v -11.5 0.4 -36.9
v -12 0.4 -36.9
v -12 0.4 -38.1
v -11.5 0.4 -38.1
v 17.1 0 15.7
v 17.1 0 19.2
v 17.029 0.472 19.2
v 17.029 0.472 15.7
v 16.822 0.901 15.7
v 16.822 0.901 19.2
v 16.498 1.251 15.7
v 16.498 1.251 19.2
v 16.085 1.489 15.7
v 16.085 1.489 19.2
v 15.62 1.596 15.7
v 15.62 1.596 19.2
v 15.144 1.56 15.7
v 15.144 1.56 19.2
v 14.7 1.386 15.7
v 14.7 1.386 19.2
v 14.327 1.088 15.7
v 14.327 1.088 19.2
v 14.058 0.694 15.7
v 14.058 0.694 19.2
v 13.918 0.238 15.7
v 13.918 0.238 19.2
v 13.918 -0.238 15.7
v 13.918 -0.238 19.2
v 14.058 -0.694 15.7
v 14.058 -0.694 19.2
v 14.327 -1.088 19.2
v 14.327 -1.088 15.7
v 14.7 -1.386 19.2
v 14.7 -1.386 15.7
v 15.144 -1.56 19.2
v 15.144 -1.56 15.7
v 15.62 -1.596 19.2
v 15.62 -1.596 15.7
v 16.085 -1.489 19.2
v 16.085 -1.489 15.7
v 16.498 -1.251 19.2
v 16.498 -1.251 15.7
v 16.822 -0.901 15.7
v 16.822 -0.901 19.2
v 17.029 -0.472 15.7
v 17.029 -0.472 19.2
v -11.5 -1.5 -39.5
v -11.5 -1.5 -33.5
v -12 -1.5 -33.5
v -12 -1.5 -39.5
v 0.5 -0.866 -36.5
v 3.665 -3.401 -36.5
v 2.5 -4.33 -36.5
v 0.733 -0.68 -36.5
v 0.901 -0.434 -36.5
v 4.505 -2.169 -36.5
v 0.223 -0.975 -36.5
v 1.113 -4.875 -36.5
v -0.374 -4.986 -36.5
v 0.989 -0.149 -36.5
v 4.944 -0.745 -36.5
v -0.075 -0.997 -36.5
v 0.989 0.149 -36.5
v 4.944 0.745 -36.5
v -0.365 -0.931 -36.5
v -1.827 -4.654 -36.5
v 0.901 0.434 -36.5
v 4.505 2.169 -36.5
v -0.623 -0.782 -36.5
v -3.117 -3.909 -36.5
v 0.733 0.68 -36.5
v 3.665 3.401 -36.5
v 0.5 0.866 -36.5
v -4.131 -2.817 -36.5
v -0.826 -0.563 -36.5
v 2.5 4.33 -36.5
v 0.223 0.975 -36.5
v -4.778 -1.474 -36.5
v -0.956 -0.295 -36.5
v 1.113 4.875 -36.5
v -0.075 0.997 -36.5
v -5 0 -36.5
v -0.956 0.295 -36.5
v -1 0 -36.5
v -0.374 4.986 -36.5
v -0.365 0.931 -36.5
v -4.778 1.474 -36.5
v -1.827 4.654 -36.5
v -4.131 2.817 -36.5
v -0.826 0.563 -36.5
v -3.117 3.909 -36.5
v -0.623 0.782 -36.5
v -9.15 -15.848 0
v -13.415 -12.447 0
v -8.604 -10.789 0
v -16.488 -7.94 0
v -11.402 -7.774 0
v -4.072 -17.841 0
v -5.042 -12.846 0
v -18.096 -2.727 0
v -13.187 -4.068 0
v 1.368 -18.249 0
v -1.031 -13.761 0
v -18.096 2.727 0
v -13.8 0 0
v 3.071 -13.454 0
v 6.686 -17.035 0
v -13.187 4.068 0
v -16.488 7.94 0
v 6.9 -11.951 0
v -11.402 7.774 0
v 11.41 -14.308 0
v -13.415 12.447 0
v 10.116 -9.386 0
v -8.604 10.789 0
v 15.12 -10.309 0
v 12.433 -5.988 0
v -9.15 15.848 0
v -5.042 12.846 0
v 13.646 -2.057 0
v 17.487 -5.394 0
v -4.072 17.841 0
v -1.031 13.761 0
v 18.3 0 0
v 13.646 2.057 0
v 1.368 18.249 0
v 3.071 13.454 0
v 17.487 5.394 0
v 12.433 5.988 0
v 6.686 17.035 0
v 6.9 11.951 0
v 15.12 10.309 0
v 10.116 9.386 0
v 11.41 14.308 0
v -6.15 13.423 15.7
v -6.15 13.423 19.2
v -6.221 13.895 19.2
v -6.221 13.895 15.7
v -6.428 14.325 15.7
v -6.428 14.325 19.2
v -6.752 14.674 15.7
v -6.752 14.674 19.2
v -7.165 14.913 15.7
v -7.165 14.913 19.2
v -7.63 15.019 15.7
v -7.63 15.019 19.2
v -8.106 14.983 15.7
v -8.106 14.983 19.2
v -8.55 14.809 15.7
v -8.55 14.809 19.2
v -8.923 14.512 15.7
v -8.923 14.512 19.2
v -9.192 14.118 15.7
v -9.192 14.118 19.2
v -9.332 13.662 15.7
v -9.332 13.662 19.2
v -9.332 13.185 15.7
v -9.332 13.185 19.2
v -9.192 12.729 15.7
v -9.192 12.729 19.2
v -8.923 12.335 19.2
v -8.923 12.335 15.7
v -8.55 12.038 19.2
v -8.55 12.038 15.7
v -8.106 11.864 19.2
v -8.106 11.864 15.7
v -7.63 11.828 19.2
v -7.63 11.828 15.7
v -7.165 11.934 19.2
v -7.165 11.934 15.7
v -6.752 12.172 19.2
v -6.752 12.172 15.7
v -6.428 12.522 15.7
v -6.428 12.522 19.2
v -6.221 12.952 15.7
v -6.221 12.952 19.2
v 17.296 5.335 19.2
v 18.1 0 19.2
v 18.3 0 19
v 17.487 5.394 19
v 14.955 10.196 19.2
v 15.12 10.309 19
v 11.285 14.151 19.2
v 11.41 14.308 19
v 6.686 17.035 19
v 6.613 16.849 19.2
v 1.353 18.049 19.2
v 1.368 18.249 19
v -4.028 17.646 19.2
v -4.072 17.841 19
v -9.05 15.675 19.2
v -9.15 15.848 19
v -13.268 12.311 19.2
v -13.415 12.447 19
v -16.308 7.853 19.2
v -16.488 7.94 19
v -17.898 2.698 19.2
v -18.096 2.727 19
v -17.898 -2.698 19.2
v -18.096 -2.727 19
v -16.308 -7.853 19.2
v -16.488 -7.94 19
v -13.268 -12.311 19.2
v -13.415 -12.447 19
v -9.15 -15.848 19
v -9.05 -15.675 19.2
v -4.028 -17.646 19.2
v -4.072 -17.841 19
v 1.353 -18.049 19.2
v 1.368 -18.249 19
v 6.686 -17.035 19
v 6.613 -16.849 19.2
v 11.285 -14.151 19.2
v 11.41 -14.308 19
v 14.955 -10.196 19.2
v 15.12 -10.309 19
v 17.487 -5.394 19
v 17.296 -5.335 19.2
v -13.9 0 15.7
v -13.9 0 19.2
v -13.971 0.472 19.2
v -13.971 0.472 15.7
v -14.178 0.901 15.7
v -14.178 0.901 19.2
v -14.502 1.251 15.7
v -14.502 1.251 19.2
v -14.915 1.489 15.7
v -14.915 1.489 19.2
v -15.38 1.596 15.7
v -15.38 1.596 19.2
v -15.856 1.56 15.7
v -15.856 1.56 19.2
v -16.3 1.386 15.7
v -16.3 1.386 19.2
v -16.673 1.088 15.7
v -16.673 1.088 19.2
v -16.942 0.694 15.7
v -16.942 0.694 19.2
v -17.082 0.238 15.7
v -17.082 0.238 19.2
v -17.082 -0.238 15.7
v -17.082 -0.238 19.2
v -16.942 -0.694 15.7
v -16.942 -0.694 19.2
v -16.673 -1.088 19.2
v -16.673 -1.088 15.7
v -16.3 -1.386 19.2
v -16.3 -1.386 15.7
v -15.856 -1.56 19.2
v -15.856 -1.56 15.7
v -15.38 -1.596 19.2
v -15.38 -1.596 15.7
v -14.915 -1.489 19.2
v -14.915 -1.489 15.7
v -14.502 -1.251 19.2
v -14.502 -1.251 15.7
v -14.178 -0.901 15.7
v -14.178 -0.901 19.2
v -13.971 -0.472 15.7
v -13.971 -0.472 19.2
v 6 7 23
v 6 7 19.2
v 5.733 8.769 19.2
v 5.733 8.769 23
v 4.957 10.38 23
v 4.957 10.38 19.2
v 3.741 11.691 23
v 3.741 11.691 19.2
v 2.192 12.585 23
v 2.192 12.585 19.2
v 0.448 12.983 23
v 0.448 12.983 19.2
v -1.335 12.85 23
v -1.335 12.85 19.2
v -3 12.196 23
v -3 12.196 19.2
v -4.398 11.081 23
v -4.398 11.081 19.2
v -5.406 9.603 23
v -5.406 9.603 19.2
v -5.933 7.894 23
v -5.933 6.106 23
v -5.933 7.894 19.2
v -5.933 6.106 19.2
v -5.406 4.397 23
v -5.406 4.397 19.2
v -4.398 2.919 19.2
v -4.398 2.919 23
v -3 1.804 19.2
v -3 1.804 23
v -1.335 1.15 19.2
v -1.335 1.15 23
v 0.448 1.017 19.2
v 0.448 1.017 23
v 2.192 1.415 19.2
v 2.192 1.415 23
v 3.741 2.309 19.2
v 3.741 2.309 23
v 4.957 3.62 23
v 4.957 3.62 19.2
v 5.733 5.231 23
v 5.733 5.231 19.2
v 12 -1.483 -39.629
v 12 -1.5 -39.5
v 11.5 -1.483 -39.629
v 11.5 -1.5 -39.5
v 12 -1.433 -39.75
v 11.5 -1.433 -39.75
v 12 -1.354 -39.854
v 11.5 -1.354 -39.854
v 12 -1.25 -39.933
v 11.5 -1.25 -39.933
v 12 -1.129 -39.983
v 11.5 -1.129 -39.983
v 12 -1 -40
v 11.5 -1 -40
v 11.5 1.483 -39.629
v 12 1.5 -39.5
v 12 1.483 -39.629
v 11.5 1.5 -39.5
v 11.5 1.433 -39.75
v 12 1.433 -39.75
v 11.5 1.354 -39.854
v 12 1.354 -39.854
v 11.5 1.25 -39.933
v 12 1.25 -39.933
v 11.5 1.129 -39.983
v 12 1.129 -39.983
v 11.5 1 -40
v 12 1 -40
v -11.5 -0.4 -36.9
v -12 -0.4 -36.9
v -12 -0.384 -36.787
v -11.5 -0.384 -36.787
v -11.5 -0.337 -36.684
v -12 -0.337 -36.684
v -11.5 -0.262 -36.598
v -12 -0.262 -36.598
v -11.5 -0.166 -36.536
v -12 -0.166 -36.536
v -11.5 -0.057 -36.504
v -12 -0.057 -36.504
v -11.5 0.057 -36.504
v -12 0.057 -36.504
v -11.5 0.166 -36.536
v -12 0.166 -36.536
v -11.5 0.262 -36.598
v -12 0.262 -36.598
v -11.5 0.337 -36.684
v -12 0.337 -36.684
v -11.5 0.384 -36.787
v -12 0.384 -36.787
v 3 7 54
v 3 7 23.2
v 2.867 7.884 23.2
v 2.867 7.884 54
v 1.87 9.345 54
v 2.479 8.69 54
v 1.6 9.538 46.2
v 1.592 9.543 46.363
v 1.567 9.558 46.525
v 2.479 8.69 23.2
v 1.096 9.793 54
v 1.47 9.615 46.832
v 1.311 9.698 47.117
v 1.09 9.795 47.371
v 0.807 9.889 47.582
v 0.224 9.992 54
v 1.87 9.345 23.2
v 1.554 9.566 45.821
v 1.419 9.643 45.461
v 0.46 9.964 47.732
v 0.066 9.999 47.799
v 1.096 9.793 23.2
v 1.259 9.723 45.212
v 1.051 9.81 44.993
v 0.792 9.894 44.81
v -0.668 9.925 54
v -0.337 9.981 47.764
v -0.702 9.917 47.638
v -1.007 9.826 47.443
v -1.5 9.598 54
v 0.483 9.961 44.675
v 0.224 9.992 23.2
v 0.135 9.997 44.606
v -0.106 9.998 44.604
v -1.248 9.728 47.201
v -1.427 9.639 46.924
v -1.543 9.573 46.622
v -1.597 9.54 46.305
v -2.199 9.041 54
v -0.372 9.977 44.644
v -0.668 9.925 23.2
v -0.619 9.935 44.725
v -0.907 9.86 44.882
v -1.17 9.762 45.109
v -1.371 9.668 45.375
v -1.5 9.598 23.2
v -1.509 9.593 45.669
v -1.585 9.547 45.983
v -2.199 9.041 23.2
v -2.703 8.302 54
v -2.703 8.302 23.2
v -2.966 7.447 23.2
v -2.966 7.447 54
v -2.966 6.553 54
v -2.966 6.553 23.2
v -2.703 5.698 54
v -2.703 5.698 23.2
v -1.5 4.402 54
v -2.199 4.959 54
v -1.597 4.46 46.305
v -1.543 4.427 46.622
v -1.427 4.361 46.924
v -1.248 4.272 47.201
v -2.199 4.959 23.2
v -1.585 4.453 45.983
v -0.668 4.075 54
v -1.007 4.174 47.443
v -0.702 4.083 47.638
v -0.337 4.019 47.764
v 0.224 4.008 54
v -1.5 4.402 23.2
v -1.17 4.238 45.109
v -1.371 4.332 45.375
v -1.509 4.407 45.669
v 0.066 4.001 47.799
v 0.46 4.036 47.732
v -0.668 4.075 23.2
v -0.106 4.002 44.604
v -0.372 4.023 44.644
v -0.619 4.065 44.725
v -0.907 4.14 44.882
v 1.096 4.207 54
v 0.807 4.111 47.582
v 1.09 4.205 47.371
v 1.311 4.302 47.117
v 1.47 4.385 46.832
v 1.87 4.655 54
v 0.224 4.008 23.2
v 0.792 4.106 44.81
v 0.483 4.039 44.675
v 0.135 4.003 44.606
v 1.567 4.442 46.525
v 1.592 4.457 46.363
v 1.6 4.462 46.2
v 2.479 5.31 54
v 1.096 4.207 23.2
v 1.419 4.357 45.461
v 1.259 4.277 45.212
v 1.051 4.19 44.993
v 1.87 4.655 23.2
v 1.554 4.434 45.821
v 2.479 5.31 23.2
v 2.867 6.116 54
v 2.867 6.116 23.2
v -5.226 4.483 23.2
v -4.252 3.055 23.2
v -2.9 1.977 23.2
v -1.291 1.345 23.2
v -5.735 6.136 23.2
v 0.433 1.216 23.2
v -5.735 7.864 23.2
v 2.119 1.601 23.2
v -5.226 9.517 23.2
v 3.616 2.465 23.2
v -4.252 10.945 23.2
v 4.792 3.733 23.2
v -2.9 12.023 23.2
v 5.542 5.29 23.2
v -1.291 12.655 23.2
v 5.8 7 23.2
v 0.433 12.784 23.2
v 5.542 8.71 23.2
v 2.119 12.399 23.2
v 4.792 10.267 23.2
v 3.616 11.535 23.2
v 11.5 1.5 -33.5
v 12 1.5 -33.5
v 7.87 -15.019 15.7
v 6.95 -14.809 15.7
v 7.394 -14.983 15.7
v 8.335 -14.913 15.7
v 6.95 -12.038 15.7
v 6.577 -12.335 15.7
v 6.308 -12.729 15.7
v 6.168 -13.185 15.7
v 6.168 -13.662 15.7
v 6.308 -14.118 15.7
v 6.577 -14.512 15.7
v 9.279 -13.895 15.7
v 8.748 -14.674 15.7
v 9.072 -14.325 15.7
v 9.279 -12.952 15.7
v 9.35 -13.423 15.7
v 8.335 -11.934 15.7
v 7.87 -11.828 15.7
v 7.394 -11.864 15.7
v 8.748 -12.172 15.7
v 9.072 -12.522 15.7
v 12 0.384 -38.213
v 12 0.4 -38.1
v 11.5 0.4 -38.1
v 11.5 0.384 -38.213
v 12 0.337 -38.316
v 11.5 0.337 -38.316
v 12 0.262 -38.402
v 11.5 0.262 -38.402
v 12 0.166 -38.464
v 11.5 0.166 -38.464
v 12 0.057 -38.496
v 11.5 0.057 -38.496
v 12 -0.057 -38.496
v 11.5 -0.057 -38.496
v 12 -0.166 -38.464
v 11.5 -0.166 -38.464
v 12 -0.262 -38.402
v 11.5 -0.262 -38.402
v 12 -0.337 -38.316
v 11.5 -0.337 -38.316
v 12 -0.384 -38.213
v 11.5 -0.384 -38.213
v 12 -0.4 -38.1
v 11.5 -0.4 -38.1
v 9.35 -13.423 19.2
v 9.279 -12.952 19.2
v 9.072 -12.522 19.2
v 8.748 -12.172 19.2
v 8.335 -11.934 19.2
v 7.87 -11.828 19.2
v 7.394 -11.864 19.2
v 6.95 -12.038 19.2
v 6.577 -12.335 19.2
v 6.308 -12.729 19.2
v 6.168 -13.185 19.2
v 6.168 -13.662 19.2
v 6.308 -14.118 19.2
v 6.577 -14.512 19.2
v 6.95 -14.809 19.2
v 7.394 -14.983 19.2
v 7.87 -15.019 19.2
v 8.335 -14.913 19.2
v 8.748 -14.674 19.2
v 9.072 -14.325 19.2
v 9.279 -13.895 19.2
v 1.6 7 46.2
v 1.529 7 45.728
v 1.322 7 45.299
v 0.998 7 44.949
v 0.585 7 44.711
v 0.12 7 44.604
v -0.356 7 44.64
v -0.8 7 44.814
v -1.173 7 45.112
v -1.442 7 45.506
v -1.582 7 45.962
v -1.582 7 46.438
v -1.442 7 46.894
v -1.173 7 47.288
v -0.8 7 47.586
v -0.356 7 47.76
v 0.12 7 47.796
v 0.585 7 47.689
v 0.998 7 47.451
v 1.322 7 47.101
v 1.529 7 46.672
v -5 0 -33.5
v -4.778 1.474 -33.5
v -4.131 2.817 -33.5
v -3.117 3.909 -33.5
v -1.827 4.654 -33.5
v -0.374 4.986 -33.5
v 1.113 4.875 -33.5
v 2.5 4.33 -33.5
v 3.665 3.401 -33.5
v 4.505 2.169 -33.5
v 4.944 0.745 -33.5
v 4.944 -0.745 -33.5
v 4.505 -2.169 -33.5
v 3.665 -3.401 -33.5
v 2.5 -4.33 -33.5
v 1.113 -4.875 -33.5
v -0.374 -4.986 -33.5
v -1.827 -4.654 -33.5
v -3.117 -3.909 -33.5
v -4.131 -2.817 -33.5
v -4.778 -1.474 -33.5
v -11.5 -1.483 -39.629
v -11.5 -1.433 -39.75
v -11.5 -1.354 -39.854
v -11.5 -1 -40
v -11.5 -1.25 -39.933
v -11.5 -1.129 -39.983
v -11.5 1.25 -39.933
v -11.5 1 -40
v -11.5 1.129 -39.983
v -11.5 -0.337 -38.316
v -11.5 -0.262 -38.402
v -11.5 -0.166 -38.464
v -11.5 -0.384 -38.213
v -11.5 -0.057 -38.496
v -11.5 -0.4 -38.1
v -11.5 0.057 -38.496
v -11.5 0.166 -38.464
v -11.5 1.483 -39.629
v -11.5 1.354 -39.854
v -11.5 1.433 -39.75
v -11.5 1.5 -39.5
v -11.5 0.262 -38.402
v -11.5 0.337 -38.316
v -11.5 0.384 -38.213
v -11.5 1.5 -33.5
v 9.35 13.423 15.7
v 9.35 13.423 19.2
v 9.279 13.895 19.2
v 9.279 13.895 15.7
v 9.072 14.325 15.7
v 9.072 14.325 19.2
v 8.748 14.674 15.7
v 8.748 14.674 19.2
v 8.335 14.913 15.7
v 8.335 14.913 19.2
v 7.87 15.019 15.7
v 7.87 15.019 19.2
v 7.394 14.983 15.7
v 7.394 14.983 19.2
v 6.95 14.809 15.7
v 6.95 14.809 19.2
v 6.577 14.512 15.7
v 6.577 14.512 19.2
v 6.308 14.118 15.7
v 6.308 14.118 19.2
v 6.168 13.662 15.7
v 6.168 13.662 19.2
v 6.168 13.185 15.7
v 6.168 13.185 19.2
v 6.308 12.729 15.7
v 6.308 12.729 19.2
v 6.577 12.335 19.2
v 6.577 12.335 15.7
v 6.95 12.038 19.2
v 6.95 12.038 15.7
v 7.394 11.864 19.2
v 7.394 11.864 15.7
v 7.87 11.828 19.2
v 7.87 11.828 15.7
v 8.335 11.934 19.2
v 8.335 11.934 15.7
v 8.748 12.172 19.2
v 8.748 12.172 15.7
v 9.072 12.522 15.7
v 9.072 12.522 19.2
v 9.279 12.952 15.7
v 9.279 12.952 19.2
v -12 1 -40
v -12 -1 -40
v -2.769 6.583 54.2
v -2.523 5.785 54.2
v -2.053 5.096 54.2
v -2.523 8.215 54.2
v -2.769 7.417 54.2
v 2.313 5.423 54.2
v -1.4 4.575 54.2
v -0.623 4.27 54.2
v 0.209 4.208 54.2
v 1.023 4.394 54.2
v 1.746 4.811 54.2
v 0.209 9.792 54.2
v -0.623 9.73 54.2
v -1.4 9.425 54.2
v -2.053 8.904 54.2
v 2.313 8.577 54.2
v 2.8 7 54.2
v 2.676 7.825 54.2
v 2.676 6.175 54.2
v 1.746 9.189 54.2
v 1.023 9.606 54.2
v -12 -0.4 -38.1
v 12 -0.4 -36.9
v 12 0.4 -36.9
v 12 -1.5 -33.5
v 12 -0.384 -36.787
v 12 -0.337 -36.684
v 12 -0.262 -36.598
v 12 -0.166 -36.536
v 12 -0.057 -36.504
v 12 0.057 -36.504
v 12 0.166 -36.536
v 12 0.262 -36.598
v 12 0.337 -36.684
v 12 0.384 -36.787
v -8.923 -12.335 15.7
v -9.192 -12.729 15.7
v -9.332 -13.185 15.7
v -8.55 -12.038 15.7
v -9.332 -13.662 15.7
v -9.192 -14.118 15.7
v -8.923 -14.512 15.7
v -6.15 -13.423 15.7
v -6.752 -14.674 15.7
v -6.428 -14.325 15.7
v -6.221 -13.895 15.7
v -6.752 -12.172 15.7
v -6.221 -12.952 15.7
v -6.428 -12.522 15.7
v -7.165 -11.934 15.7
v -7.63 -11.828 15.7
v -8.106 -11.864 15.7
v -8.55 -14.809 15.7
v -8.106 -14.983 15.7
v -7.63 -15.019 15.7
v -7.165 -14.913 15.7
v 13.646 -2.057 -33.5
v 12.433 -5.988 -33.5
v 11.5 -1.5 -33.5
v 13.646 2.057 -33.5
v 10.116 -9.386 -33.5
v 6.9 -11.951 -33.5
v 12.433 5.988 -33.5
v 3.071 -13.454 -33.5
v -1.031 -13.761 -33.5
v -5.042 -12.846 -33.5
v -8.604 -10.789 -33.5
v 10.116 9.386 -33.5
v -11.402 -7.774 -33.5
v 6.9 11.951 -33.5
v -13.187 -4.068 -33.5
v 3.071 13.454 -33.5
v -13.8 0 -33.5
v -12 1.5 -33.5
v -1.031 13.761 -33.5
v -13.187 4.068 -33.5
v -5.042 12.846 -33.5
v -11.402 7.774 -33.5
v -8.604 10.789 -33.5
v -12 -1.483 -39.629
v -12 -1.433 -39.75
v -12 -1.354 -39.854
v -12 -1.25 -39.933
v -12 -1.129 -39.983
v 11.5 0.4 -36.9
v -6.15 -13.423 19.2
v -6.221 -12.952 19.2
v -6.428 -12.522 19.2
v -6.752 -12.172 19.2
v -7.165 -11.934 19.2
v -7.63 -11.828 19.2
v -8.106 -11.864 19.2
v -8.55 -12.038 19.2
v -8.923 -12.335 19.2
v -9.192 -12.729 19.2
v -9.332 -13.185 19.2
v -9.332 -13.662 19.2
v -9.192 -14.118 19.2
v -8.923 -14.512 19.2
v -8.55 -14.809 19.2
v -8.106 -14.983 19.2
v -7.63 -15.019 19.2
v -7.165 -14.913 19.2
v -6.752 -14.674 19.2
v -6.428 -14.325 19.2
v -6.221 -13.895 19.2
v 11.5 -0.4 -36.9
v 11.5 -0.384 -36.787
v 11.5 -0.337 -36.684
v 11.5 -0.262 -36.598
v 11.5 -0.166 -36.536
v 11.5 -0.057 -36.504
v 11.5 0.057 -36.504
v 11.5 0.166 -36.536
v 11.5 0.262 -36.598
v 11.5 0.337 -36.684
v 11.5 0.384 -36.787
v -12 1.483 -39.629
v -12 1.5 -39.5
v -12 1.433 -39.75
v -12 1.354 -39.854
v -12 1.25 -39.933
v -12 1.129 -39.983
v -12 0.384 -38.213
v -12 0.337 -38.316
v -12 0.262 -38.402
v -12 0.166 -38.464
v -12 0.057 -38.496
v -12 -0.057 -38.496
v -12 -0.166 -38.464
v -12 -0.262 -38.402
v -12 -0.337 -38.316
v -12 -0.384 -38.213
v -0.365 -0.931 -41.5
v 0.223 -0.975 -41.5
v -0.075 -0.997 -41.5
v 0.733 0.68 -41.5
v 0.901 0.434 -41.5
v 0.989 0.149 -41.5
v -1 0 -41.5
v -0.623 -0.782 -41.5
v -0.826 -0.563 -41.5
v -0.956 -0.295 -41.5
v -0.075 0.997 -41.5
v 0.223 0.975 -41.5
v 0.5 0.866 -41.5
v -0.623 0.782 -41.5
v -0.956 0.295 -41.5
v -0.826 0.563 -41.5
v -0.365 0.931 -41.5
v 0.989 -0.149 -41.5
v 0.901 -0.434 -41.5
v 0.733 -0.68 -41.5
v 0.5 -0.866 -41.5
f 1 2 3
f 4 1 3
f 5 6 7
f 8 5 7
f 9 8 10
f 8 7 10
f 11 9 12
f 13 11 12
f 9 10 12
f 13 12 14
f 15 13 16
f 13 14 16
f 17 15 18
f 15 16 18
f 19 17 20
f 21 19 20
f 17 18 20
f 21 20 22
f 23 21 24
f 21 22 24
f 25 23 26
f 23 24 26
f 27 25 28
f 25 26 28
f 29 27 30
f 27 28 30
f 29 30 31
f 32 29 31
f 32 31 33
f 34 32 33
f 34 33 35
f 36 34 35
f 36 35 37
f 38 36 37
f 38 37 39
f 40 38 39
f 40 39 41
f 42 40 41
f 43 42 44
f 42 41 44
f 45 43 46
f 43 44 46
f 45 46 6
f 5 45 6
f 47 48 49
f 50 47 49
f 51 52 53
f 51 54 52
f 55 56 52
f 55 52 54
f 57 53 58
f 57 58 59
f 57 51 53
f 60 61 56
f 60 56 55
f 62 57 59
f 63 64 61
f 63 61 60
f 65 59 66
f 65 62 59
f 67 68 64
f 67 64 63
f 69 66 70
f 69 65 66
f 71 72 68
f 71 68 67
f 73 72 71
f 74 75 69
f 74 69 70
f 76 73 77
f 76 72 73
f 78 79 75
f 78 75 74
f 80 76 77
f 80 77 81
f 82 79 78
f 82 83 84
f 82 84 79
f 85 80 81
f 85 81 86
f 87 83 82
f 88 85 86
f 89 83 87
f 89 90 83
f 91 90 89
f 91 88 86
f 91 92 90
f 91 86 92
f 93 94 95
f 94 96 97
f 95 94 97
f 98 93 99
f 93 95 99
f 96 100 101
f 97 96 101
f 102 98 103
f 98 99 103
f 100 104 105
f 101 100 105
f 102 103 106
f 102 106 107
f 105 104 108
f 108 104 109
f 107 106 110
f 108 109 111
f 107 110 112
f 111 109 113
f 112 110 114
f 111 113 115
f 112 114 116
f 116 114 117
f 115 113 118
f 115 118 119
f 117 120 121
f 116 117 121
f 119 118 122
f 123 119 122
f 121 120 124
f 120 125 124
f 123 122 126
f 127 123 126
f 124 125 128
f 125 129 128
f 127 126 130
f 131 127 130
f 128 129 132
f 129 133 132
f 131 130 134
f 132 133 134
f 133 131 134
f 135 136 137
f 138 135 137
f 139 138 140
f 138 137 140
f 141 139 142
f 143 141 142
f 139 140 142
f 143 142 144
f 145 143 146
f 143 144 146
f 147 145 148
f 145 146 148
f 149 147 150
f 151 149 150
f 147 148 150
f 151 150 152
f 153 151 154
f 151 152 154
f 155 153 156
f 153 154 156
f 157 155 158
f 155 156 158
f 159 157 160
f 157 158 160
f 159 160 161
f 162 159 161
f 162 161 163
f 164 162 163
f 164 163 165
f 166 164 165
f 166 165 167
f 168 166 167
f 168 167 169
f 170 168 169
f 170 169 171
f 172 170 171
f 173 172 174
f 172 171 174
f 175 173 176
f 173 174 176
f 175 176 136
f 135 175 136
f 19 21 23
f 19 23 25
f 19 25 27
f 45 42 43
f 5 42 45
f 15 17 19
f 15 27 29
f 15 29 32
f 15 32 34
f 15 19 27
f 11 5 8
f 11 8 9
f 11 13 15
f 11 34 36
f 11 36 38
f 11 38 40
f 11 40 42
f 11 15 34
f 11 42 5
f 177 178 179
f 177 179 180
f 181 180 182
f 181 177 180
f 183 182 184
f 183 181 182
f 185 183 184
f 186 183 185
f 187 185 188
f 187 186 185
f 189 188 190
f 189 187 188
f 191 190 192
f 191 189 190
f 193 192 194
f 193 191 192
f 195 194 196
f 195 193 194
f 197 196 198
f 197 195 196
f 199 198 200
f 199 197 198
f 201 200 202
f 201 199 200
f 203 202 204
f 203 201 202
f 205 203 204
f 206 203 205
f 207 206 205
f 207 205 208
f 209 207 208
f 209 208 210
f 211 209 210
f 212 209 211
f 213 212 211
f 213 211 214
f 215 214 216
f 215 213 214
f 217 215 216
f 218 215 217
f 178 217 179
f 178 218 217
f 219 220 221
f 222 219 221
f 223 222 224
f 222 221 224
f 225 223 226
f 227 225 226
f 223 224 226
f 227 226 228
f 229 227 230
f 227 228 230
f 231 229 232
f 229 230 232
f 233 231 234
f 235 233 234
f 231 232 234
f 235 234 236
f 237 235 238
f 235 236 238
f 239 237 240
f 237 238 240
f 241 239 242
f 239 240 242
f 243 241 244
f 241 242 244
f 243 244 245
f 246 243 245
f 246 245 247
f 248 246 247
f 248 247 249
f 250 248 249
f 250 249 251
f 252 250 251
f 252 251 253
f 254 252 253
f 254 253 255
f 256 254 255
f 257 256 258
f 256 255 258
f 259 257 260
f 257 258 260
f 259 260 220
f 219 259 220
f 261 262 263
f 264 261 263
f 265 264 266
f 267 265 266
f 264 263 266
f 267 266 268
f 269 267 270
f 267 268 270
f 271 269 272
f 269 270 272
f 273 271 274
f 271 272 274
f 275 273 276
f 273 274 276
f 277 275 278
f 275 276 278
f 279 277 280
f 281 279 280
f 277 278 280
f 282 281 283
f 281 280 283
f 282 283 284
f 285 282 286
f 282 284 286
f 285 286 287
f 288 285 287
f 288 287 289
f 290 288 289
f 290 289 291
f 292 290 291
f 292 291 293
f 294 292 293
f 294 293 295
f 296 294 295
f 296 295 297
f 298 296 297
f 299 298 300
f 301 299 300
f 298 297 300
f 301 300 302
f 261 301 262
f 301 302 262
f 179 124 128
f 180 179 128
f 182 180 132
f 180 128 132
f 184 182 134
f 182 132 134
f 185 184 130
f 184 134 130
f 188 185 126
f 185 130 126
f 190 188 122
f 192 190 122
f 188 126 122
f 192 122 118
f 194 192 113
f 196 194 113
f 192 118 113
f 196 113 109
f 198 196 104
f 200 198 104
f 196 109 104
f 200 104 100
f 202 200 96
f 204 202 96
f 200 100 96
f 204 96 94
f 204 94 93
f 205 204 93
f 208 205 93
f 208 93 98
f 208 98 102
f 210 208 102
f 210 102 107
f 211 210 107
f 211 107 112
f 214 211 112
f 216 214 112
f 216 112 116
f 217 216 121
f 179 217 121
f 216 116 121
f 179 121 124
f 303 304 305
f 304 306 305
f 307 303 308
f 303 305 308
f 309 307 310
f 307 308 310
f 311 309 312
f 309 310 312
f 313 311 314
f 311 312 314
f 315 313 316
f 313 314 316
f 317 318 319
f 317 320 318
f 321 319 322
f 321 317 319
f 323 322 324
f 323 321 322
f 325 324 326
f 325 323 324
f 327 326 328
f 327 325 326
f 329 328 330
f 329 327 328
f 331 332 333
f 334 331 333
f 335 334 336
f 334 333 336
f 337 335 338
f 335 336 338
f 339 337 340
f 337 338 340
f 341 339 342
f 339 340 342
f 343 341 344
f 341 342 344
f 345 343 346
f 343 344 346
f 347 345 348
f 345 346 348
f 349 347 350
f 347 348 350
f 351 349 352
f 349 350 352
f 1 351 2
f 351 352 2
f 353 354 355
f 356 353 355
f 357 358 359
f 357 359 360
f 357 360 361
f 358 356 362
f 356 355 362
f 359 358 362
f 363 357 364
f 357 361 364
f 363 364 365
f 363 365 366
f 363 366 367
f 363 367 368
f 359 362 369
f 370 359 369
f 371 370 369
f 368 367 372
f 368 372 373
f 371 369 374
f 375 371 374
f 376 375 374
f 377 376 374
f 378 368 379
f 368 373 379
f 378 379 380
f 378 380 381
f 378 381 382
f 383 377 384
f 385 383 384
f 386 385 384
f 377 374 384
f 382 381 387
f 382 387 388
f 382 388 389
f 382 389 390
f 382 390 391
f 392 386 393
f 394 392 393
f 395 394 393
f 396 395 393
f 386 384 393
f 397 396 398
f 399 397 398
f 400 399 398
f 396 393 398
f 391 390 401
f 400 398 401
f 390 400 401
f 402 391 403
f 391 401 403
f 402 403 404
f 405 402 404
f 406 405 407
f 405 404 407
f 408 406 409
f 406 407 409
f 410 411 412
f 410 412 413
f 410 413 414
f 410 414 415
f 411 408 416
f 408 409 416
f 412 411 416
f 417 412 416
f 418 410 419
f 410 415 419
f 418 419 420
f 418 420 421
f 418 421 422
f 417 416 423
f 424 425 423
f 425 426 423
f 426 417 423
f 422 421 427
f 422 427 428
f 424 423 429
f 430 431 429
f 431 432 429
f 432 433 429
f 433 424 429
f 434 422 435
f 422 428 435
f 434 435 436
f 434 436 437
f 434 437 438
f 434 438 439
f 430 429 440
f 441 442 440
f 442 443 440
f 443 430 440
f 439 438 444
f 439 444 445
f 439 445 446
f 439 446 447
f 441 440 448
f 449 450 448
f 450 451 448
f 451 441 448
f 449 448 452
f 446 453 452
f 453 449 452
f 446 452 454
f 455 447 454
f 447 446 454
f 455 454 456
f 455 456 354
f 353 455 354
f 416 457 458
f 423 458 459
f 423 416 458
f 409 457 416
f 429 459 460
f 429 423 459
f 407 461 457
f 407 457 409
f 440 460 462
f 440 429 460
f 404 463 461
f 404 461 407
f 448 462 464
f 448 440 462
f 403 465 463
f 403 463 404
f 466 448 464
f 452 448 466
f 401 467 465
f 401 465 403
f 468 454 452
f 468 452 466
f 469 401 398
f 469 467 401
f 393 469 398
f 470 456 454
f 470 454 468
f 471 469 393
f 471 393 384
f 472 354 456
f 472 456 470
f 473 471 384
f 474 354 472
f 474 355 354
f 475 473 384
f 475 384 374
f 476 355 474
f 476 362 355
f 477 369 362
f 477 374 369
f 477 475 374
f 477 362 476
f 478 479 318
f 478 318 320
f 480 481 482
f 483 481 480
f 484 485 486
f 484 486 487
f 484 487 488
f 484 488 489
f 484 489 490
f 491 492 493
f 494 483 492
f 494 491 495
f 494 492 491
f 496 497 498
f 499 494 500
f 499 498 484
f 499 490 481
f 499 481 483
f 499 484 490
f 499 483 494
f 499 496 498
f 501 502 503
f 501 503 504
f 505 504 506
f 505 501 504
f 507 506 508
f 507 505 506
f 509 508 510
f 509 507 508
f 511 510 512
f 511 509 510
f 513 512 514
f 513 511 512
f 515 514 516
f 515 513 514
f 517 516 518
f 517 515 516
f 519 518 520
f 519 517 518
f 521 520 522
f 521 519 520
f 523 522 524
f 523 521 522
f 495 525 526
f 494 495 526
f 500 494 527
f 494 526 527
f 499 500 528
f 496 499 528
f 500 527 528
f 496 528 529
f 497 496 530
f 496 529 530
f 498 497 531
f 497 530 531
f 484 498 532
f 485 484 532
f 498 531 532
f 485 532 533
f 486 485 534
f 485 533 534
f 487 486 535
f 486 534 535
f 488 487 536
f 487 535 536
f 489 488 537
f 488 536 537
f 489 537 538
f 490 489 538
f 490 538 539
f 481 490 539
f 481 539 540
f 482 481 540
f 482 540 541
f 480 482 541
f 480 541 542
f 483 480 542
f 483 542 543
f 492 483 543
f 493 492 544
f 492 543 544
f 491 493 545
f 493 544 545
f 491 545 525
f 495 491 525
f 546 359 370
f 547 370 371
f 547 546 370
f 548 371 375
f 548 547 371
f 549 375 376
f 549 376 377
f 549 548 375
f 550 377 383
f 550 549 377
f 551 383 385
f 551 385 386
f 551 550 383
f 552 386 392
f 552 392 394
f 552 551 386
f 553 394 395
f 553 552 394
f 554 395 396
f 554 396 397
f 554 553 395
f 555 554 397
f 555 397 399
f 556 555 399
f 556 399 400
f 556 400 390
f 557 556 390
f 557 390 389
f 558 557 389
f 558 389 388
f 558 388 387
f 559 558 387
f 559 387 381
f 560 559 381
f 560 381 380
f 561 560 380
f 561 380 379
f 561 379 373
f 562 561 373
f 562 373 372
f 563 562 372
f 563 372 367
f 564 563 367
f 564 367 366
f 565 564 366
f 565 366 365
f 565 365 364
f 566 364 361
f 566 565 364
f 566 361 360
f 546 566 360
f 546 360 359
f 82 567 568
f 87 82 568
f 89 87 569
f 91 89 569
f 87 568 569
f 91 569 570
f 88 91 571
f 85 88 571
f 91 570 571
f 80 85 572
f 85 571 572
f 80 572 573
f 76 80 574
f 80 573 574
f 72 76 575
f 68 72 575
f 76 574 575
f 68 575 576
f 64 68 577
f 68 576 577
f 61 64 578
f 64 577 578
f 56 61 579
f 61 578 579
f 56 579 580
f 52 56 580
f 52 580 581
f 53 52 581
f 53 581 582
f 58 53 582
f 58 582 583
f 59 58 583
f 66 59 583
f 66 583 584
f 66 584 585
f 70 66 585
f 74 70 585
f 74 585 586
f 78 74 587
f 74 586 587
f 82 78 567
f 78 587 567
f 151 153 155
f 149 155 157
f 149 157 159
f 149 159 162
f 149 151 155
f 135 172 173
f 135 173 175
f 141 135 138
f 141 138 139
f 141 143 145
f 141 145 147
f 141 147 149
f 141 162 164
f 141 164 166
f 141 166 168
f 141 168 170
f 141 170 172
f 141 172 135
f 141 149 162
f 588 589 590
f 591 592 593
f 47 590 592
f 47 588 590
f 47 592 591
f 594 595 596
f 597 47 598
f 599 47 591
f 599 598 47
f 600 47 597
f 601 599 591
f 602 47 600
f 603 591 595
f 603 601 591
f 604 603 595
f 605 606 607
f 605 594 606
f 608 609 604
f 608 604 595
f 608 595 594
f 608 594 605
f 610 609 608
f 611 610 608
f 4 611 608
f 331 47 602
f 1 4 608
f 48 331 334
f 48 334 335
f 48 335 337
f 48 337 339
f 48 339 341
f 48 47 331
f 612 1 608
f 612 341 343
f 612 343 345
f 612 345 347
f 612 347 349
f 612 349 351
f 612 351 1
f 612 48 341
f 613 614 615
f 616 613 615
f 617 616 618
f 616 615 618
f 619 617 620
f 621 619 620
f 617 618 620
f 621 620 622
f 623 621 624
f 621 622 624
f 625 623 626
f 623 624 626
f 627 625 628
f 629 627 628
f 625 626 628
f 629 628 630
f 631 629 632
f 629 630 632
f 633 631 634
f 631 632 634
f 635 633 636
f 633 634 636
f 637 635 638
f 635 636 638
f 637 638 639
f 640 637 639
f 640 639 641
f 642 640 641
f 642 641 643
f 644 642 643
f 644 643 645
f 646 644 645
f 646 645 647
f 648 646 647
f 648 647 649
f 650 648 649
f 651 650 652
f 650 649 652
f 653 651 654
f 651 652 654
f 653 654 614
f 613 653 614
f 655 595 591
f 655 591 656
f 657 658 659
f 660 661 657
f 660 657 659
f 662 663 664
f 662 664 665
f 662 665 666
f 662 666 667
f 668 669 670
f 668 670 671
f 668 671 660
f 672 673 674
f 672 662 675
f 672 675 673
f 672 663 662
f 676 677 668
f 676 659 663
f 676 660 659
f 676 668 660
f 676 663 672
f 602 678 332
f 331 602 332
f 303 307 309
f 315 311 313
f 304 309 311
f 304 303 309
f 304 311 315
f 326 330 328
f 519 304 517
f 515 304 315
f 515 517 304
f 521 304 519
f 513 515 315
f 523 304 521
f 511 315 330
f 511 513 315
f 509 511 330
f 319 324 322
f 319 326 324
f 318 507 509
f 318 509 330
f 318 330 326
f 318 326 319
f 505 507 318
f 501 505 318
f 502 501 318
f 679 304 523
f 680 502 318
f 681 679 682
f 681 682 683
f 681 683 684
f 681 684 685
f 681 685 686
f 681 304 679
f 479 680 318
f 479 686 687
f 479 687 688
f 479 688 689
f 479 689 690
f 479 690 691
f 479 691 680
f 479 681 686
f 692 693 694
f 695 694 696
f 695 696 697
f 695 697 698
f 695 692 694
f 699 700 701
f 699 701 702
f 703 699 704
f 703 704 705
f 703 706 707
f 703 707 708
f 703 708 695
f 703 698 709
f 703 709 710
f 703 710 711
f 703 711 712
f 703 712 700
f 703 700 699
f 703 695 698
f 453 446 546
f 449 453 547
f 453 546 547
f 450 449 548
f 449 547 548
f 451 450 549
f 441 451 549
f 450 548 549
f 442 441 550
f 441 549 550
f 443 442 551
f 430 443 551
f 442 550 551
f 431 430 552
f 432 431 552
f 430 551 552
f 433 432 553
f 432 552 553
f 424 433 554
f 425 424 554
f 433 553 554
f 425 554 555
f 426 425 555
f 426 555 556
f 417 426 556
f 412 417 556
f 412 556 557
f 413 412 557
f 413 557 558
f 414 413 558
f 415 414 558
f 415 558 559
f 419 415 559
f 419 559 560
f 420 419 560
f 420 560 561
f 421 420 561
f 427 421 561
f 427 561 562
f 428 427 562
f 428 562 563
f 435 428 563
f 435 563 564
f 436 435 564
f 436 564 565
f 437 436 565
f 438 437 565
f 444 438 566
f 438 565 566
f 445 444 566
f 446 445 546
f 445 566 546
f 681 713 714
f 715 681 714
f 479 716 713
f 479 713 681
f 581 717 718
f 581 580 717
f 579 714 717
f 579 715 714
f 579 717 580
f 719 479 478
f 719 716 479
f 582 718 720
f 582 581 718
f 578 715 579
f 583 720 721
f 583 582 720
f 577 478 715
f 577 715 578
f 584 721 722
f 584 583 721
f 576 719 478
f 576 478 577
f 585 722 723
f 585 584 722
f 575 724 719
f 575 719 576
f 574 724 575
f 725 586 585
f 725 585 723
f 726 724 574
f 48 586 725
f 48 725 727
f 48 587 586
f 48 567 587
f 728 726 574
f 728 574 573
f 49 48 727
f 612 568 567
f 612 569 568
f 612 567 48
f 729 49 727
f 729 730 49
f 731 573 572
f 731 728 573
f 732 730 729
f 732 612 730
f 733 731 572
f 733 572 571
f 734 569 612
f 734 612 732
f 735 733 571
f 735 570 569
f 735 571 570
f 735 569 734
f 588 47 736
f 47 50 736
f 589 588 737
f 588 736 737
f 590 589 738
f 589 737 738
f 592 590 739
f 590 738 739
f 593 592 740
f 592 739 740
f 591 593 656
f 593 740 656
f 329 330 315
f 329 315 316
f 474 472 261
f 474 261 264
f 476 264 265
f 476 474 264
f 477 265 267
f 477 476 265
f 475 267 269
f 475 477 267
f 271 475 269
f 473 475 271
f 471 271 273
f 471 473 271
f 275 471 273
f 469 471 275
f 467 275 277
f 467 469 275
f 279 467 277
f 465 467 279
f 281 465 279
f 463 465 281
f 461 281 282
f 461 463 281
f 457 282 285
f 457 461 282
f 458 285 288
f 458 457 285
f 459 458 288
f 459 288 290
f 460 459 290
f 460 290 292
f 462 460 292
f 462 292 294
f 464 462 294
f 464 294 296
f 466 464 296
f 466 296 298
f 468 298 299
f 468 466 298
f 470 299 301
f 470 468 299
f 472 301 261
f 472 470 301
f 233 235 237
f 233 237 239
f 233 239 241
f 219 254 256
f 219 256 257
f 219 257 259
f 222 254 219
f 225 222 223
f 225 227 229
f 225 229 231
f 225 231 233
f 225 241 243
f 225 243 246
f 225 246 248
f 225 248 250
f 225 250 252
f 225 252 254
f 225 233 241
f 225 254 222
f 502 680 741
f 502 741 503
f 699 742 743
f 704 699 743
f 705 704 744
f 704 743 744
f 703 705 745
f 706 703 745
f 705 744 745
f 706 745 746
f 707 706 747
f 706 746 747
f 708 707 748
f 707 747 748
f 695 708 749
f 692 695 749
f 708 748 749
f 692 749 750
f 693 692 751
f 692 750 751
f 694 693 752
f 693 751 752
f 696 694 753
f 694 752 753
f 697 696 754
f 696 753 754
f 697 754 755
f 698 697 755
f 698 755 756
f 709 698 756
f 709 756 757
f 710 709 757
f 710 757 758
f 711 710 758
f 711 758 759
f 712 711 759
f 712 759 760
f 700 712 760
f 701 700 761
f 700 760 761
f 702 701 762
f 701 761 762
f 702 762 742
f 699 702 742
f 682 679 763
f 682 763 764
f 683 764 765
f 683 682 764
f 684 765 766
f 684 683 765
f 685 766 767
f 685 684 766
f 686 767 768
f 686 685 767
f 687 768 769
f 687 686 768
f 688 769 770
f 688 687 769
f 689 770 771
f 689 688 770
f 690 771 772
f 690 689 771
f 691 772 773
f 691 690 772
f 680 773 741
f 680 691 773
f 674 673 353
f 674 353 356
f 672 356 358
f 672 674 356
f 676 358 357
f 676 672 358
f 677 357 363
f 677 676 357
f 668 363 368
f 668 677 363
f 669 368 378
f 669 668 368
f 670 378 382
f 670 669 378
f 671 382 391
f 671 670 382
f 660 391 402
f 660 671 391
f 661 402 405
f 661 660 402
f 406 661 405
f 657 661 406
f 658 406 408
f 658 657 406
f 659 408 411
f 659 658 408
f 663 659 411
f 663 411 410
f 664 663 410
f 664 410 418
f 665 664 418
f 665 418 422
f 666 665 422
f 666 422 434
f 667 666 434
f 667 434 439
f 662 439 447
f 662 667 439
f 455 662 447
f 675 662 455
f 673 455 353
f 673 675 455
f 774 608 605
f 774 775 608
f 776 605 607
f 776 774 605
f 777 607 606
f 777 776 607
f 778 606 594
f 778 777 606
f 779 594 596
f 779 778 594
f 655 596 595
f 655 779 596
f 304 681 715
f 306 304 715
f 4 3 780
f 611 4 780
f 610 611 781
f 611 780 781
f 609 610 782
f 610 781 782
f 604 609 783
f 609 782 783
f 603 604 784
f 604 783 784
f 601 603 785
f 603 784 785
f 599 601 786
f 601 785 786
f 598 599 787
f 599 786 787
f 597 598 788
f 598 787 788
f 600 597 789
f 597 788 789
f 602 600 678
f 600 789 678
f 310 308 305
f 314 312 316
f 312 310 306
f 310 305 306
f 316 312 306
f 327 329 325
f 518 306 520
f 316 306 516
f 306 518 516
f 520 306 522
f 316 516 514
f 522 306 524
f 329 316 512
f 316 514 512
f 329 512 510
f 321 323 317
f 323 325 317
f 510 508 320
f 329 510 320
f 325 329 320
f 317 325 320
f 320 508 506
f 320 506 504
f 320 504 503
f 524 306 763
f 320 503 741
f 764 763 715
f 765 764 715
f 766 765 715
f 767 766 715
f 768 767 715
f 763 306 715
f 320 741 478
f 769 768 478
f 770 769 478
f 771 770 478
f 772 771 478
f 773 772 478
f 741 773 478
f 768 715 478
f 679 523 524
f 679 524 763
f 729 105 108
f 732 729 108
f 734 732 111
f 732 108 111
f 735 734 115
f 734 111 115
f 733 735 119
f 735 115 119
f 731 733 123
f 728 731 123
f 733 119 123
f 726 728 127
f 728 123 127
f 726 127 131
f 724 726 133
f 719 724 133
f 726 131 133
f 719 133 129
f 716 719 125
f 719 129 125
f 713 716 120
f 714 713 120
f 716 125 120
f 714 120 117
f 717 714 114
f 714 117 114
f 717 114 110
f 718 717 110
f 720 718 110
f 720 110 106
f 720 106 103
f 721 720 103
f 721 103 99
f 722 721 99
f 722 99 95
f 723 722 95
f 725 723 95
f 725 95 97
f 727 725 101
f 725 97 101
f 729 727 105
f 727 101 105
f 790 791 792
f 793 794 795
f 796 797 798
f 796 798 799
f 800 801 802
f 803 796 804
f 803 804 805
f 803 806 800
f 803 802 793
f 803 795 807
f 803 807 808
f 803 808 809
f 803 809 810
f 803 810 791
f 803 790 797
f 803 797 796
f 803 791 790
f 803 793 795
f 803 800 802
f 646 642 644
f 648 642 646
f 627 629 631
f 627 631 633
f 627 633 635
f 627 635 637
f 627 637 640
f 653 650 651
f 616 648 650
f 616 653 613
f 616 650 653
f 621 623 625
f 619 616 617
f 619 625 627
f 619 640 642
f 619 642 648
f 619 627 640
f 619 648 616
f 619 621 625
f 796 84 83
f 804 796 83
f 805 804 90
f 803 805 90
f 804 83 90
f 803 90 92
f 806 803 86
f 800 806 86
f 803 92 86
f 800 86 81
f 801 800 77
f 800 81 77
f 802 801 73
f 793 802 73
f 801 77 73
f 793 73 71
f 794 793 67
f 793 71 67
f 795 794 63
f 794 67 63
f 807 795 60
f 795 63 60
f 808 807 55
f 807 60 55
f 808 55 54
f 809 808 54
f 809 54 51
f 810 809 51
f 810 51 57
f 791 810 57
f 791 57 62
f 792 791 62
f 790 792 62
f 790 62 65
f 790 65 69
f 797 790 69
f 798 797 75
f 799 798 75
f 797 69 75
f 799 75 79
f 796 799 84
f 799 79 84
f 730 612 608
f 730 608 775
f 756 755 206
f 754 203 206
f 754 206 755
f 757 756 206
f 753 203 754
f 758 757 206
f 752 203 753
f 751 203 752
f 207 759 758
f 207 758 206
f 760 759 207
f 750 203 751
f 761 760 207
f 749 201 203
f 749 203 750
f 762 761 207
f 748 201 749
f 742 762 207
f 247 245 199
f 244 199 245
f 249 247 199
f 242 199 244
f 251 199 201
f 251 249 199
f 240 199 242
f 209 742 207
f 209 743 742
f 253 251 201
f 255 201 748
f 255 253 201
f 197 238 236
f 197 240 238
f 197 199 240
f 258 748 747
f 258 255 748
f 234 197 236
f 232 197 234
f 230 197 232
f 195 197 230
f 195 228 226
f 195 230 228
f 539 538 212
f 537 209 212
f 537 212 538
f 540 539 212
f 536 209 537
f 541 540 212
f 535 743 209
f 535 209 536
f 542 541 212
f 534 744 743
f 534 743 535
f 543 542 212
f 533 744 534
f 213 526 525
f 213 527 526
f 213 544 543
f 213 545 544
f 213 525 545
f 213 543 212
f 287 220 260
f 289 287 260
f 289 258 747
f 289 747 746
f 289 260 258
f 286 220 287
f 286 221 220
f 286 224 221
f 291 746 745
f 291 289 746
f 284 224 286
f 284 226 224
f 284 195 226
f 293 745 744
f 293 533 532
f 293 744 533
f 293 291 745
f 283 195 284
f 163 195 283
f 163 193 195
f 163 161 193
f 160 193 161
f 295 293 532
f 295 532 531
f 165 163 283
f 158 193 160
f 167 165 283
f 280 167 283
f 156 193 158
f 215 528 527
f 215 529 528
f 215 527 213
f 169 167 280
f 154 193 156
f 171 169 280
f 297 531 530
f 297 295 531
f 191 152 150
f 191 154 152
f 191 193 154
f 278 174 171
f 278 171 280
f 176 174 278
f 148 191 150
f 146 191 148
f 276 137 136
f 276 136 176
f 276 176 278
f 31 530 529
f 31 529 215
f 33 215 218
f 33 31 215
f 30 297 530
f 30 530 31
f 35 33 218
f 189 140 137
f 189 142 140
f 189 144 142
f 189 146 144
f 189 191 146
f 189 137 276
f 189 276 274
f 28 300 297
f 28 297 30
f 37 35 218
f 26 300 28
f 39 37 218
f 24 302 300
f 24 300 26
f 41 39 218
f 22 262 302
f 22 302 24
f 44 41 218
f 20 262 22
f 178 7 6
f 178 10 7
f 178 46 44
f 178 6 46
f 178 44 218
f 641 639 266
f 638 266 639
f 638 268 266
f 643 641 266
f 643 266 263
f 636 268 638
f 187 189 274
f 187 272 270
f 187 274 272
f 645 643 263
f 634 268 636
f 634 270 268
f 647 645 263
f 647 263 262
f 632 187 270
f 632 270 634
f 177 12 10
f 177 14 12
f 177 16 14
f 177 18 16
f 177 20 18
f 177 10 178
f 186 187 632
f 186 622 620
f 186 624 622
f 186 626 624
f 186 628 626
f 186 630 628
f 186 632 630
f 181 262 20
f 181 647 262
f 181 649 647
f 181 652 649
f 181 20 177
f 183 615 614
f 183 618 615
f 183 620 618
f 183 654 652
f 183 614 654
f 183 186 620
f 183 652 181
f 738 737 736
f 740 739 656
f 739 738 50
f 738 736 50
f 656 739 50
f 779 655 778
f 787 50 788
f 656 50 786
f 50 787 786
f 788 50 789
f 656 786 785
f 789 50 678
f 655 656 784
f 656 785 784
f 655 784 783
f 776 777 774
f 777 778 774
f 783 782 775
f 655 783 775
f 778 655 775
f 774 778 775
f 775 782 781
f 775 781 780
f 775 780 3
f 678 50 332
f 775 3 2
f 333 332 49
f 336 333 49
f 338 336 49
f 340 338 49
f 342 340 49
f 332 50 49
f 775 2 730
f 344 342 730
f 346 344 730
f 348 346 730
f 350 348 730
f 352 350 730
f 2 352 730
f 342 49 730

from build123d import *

# Parameters (mm, degrees)
SKETCH1_R               = 18.3
BOSS_EXTRUDE1_DEPTH     = 19.2
SKETCH2_R               = 1.6
CUT_EXTRUDE1_DEPTH      = 3.5
SKETCH3_R               = 3
BOSS_EXTRUDE2_DEPTH     = 35
SKETCH3_3_R             = 6
SKETCH3_3_R_2           = 3
BOSS_EXTRUDE3_DEPTH     = 4
SKETCH4_R               = 13.8
BOSS_EXTRUDE4_DEPTH     = 33.5
SKETCH5_R               = 5
BOSS_EXTRUDE5_DEPTH     = 3
SKETCH6_R               = 1
BOSS_EXTRUDE6_DEPTH     = 5
SKETCH7_W               = 0.5
SKETCH7_H               = 3
BOSS_EXTRUDE7_DEPTH     = 6.5
CUT_EXTRUDE2_DEPTH      = 0.5
FILLET1_R               = 0.5
CHAMFER1_SIZE           = 0.2
SKETCH9_R               = 1.6
CUT_EXTRUDE3_DEPTH      = 12.3
CUT_EXTRUDE3_DEPTH_BACK = 26.3


with BuildPart() as part:
    # Sketch1 → Boss-Extrude1 (new body)
    with BuildSketch(Plane.XY):
        Circle(SKETCH1_R)
    extrude(amount=BOSS_EXTRUDE1_DEPTH)

    # Sketch2 → Cut-Extrude1 (cut)
    with BuildSketch(Plane.XY.offset(19.2)):
        with Locations((-7.75, 13.423393759)):
            Circle(SKETCH2_R)
        with Locations((7.75, 13.423393759)):
            Circle(SKETCH2_R)
        with Locations((-15.5, 0)):
            Circle(SKETCH2_R)
        with Locations((-7.75, -13.423393759)):
            Circle(SKETCH2_R)
        with Locations((7.75, -13.423393759)):
            Circle(SKETCH2_R)
        with Locations((15.5, 0)):
            Circle(SKETCH2_R)
    extrude(amount=-CUT_EXTRUDE1_DEPTH, mode=Mode.SUBTRACT)

    # Sketch3 → Boss-Extrude2 (add)
    with BuildSketch(Plane.XY.offset(19.2)):
        with Locations((0, 7)):
            Circle(SKETCH3_R)
    extrude(amount=BOSS_EXTRUDE2_DEPTH)

    # Sketch3<3> → Boss-Extrude3 (add)
    with BuildSketch(Plane.XY.offset(19.2)):
        with Locations((0, 7)):
            Circle(SKETCH3_3_R)
        with Locations((0, 7)):
            Circle(SKETCH3_3_R_2, mode=Mode.SUBTRACT)
    extrude(amount=BOSS_EXTRUDE3_DEPTH)

    # Sketch4 → Boss-Extrude4 (add)
    with BuildSketch(Plane(origin=(0, 0, 0), x_dir=(-1, 0, 0), z_dir=(0, 0, -1))):
        Circle(SKETCH4_R)
    extrude(amount=BOSS_EXTRUDE4_DEPTH)

    # Sketch5 → Boss-Extrude5 (add)
    with BuildSketch(Plane(origin=(0, 0, -33.5), x_dir=(-1, 0, 0), z_dir=(0, 0, -1))):
        Circle(SKETCH5_R)
    extrude(amount=BOSS_EXTRUDE5_DEPTH)

    # Sketch6 → Boss-Extrude6 (add)
    with BuildSketch(Plane(origin=(0, 0, -36.5), x_dir=(-1, 0, 0), z_dir=(0, 0, -1))):
        Circle(SKETCH6_R)
    extrude(amount=BOSS_EXTRUDE6_DEPTH)

    # Sketch7 → Boss-Extrude7 (add)
    with BuildSketch(Plane(origin=(0, 0, -33.5), x_dir=(-1, 0, 0), z_dir=(0, 0, -1))):
        with Locations((-11.75, 0)):
            Rectangle(SKETCH7_W, SKETCH7_H)
        with Locations((11.75, 0)):
            Rectangle(SKETCH7_W, SKETCH7_H)
    extrude(amount=BOSS_EXTRUDE7_DEPTH)

    # Sketch8 → Cut-Extrude2 (cut)
    with BuildSketch(Plane(origin=(12, 0, 0), x_dir=(0, 0, -1), z_dir=(1, 0, 0))):
        with BuildLine():
            Line((38.1, -0.4), (36.9, -0.4))
            ThreePointArc((36.9, -0.4), (36.5, 0), (36.9, 0.4))
            Line((36.9, 0.4), (38.1, 0.4))
            ThreePointArc((38.1, 0.4), (38.5, 0), (38.1, -0.4))
        make_face()
    cut_extrude2 = extrude(amount=-CUT_EXTRUDE2_DEPTH, mode=Mode.SUBTRACT)

    # Mirror2: Cut-Extrude2 across plane
    add(cut_extrude2.mirror(Plane(origin=(0, 0, 0), x_dir=(0, 0, 1), z_dir=(1, 0, 0))), mode=Mode.SUBTRACT)

    # Fillet1
    fillet1_edges = [part.edges().sort_by_distance(p)[0] for p in [
        (11.75, -1.5, -40),
        (11.75, 1.5, -40),
        (-11.75, 1.5, -40),
        (-11.75, -1.5, -40),
    ]]
    fillet(fillet1_edges, radius=FILLET1_R)

    # Chamfer1
    chamfer1_edges = [part.edges().sort_by_distance(p)[0] for p in [
        (-3, 7, 54.2),
        (-6, 7, 23.2),
        (-18.3, 0, 19.2),
    ]]
    chamfer(chamfer1_edges, length=CHAMFER1_SIZE)

    # Sketch9 → Cut-Extrude3 (cut, two sides)
    with BuildSketch(Plane(origin=(0, 7, 0), x_dir=(1, 0, 0), z_dir=(0, 1, 0))) as cut_extrude3_sk:
        with Locations((0, -46.2)):
            Circle(SKETCH9_R)
    extrude(amount=CUT_EXTRUDE3_DEPTH, mode=Mode.SUBTRACT)
    extrude(cut_extrude3_sk.sketch, amount=-CUT_EXTRUDE3_DEPTH_BACK, mode=Mode.SUBTRACT)


solid = part.part
